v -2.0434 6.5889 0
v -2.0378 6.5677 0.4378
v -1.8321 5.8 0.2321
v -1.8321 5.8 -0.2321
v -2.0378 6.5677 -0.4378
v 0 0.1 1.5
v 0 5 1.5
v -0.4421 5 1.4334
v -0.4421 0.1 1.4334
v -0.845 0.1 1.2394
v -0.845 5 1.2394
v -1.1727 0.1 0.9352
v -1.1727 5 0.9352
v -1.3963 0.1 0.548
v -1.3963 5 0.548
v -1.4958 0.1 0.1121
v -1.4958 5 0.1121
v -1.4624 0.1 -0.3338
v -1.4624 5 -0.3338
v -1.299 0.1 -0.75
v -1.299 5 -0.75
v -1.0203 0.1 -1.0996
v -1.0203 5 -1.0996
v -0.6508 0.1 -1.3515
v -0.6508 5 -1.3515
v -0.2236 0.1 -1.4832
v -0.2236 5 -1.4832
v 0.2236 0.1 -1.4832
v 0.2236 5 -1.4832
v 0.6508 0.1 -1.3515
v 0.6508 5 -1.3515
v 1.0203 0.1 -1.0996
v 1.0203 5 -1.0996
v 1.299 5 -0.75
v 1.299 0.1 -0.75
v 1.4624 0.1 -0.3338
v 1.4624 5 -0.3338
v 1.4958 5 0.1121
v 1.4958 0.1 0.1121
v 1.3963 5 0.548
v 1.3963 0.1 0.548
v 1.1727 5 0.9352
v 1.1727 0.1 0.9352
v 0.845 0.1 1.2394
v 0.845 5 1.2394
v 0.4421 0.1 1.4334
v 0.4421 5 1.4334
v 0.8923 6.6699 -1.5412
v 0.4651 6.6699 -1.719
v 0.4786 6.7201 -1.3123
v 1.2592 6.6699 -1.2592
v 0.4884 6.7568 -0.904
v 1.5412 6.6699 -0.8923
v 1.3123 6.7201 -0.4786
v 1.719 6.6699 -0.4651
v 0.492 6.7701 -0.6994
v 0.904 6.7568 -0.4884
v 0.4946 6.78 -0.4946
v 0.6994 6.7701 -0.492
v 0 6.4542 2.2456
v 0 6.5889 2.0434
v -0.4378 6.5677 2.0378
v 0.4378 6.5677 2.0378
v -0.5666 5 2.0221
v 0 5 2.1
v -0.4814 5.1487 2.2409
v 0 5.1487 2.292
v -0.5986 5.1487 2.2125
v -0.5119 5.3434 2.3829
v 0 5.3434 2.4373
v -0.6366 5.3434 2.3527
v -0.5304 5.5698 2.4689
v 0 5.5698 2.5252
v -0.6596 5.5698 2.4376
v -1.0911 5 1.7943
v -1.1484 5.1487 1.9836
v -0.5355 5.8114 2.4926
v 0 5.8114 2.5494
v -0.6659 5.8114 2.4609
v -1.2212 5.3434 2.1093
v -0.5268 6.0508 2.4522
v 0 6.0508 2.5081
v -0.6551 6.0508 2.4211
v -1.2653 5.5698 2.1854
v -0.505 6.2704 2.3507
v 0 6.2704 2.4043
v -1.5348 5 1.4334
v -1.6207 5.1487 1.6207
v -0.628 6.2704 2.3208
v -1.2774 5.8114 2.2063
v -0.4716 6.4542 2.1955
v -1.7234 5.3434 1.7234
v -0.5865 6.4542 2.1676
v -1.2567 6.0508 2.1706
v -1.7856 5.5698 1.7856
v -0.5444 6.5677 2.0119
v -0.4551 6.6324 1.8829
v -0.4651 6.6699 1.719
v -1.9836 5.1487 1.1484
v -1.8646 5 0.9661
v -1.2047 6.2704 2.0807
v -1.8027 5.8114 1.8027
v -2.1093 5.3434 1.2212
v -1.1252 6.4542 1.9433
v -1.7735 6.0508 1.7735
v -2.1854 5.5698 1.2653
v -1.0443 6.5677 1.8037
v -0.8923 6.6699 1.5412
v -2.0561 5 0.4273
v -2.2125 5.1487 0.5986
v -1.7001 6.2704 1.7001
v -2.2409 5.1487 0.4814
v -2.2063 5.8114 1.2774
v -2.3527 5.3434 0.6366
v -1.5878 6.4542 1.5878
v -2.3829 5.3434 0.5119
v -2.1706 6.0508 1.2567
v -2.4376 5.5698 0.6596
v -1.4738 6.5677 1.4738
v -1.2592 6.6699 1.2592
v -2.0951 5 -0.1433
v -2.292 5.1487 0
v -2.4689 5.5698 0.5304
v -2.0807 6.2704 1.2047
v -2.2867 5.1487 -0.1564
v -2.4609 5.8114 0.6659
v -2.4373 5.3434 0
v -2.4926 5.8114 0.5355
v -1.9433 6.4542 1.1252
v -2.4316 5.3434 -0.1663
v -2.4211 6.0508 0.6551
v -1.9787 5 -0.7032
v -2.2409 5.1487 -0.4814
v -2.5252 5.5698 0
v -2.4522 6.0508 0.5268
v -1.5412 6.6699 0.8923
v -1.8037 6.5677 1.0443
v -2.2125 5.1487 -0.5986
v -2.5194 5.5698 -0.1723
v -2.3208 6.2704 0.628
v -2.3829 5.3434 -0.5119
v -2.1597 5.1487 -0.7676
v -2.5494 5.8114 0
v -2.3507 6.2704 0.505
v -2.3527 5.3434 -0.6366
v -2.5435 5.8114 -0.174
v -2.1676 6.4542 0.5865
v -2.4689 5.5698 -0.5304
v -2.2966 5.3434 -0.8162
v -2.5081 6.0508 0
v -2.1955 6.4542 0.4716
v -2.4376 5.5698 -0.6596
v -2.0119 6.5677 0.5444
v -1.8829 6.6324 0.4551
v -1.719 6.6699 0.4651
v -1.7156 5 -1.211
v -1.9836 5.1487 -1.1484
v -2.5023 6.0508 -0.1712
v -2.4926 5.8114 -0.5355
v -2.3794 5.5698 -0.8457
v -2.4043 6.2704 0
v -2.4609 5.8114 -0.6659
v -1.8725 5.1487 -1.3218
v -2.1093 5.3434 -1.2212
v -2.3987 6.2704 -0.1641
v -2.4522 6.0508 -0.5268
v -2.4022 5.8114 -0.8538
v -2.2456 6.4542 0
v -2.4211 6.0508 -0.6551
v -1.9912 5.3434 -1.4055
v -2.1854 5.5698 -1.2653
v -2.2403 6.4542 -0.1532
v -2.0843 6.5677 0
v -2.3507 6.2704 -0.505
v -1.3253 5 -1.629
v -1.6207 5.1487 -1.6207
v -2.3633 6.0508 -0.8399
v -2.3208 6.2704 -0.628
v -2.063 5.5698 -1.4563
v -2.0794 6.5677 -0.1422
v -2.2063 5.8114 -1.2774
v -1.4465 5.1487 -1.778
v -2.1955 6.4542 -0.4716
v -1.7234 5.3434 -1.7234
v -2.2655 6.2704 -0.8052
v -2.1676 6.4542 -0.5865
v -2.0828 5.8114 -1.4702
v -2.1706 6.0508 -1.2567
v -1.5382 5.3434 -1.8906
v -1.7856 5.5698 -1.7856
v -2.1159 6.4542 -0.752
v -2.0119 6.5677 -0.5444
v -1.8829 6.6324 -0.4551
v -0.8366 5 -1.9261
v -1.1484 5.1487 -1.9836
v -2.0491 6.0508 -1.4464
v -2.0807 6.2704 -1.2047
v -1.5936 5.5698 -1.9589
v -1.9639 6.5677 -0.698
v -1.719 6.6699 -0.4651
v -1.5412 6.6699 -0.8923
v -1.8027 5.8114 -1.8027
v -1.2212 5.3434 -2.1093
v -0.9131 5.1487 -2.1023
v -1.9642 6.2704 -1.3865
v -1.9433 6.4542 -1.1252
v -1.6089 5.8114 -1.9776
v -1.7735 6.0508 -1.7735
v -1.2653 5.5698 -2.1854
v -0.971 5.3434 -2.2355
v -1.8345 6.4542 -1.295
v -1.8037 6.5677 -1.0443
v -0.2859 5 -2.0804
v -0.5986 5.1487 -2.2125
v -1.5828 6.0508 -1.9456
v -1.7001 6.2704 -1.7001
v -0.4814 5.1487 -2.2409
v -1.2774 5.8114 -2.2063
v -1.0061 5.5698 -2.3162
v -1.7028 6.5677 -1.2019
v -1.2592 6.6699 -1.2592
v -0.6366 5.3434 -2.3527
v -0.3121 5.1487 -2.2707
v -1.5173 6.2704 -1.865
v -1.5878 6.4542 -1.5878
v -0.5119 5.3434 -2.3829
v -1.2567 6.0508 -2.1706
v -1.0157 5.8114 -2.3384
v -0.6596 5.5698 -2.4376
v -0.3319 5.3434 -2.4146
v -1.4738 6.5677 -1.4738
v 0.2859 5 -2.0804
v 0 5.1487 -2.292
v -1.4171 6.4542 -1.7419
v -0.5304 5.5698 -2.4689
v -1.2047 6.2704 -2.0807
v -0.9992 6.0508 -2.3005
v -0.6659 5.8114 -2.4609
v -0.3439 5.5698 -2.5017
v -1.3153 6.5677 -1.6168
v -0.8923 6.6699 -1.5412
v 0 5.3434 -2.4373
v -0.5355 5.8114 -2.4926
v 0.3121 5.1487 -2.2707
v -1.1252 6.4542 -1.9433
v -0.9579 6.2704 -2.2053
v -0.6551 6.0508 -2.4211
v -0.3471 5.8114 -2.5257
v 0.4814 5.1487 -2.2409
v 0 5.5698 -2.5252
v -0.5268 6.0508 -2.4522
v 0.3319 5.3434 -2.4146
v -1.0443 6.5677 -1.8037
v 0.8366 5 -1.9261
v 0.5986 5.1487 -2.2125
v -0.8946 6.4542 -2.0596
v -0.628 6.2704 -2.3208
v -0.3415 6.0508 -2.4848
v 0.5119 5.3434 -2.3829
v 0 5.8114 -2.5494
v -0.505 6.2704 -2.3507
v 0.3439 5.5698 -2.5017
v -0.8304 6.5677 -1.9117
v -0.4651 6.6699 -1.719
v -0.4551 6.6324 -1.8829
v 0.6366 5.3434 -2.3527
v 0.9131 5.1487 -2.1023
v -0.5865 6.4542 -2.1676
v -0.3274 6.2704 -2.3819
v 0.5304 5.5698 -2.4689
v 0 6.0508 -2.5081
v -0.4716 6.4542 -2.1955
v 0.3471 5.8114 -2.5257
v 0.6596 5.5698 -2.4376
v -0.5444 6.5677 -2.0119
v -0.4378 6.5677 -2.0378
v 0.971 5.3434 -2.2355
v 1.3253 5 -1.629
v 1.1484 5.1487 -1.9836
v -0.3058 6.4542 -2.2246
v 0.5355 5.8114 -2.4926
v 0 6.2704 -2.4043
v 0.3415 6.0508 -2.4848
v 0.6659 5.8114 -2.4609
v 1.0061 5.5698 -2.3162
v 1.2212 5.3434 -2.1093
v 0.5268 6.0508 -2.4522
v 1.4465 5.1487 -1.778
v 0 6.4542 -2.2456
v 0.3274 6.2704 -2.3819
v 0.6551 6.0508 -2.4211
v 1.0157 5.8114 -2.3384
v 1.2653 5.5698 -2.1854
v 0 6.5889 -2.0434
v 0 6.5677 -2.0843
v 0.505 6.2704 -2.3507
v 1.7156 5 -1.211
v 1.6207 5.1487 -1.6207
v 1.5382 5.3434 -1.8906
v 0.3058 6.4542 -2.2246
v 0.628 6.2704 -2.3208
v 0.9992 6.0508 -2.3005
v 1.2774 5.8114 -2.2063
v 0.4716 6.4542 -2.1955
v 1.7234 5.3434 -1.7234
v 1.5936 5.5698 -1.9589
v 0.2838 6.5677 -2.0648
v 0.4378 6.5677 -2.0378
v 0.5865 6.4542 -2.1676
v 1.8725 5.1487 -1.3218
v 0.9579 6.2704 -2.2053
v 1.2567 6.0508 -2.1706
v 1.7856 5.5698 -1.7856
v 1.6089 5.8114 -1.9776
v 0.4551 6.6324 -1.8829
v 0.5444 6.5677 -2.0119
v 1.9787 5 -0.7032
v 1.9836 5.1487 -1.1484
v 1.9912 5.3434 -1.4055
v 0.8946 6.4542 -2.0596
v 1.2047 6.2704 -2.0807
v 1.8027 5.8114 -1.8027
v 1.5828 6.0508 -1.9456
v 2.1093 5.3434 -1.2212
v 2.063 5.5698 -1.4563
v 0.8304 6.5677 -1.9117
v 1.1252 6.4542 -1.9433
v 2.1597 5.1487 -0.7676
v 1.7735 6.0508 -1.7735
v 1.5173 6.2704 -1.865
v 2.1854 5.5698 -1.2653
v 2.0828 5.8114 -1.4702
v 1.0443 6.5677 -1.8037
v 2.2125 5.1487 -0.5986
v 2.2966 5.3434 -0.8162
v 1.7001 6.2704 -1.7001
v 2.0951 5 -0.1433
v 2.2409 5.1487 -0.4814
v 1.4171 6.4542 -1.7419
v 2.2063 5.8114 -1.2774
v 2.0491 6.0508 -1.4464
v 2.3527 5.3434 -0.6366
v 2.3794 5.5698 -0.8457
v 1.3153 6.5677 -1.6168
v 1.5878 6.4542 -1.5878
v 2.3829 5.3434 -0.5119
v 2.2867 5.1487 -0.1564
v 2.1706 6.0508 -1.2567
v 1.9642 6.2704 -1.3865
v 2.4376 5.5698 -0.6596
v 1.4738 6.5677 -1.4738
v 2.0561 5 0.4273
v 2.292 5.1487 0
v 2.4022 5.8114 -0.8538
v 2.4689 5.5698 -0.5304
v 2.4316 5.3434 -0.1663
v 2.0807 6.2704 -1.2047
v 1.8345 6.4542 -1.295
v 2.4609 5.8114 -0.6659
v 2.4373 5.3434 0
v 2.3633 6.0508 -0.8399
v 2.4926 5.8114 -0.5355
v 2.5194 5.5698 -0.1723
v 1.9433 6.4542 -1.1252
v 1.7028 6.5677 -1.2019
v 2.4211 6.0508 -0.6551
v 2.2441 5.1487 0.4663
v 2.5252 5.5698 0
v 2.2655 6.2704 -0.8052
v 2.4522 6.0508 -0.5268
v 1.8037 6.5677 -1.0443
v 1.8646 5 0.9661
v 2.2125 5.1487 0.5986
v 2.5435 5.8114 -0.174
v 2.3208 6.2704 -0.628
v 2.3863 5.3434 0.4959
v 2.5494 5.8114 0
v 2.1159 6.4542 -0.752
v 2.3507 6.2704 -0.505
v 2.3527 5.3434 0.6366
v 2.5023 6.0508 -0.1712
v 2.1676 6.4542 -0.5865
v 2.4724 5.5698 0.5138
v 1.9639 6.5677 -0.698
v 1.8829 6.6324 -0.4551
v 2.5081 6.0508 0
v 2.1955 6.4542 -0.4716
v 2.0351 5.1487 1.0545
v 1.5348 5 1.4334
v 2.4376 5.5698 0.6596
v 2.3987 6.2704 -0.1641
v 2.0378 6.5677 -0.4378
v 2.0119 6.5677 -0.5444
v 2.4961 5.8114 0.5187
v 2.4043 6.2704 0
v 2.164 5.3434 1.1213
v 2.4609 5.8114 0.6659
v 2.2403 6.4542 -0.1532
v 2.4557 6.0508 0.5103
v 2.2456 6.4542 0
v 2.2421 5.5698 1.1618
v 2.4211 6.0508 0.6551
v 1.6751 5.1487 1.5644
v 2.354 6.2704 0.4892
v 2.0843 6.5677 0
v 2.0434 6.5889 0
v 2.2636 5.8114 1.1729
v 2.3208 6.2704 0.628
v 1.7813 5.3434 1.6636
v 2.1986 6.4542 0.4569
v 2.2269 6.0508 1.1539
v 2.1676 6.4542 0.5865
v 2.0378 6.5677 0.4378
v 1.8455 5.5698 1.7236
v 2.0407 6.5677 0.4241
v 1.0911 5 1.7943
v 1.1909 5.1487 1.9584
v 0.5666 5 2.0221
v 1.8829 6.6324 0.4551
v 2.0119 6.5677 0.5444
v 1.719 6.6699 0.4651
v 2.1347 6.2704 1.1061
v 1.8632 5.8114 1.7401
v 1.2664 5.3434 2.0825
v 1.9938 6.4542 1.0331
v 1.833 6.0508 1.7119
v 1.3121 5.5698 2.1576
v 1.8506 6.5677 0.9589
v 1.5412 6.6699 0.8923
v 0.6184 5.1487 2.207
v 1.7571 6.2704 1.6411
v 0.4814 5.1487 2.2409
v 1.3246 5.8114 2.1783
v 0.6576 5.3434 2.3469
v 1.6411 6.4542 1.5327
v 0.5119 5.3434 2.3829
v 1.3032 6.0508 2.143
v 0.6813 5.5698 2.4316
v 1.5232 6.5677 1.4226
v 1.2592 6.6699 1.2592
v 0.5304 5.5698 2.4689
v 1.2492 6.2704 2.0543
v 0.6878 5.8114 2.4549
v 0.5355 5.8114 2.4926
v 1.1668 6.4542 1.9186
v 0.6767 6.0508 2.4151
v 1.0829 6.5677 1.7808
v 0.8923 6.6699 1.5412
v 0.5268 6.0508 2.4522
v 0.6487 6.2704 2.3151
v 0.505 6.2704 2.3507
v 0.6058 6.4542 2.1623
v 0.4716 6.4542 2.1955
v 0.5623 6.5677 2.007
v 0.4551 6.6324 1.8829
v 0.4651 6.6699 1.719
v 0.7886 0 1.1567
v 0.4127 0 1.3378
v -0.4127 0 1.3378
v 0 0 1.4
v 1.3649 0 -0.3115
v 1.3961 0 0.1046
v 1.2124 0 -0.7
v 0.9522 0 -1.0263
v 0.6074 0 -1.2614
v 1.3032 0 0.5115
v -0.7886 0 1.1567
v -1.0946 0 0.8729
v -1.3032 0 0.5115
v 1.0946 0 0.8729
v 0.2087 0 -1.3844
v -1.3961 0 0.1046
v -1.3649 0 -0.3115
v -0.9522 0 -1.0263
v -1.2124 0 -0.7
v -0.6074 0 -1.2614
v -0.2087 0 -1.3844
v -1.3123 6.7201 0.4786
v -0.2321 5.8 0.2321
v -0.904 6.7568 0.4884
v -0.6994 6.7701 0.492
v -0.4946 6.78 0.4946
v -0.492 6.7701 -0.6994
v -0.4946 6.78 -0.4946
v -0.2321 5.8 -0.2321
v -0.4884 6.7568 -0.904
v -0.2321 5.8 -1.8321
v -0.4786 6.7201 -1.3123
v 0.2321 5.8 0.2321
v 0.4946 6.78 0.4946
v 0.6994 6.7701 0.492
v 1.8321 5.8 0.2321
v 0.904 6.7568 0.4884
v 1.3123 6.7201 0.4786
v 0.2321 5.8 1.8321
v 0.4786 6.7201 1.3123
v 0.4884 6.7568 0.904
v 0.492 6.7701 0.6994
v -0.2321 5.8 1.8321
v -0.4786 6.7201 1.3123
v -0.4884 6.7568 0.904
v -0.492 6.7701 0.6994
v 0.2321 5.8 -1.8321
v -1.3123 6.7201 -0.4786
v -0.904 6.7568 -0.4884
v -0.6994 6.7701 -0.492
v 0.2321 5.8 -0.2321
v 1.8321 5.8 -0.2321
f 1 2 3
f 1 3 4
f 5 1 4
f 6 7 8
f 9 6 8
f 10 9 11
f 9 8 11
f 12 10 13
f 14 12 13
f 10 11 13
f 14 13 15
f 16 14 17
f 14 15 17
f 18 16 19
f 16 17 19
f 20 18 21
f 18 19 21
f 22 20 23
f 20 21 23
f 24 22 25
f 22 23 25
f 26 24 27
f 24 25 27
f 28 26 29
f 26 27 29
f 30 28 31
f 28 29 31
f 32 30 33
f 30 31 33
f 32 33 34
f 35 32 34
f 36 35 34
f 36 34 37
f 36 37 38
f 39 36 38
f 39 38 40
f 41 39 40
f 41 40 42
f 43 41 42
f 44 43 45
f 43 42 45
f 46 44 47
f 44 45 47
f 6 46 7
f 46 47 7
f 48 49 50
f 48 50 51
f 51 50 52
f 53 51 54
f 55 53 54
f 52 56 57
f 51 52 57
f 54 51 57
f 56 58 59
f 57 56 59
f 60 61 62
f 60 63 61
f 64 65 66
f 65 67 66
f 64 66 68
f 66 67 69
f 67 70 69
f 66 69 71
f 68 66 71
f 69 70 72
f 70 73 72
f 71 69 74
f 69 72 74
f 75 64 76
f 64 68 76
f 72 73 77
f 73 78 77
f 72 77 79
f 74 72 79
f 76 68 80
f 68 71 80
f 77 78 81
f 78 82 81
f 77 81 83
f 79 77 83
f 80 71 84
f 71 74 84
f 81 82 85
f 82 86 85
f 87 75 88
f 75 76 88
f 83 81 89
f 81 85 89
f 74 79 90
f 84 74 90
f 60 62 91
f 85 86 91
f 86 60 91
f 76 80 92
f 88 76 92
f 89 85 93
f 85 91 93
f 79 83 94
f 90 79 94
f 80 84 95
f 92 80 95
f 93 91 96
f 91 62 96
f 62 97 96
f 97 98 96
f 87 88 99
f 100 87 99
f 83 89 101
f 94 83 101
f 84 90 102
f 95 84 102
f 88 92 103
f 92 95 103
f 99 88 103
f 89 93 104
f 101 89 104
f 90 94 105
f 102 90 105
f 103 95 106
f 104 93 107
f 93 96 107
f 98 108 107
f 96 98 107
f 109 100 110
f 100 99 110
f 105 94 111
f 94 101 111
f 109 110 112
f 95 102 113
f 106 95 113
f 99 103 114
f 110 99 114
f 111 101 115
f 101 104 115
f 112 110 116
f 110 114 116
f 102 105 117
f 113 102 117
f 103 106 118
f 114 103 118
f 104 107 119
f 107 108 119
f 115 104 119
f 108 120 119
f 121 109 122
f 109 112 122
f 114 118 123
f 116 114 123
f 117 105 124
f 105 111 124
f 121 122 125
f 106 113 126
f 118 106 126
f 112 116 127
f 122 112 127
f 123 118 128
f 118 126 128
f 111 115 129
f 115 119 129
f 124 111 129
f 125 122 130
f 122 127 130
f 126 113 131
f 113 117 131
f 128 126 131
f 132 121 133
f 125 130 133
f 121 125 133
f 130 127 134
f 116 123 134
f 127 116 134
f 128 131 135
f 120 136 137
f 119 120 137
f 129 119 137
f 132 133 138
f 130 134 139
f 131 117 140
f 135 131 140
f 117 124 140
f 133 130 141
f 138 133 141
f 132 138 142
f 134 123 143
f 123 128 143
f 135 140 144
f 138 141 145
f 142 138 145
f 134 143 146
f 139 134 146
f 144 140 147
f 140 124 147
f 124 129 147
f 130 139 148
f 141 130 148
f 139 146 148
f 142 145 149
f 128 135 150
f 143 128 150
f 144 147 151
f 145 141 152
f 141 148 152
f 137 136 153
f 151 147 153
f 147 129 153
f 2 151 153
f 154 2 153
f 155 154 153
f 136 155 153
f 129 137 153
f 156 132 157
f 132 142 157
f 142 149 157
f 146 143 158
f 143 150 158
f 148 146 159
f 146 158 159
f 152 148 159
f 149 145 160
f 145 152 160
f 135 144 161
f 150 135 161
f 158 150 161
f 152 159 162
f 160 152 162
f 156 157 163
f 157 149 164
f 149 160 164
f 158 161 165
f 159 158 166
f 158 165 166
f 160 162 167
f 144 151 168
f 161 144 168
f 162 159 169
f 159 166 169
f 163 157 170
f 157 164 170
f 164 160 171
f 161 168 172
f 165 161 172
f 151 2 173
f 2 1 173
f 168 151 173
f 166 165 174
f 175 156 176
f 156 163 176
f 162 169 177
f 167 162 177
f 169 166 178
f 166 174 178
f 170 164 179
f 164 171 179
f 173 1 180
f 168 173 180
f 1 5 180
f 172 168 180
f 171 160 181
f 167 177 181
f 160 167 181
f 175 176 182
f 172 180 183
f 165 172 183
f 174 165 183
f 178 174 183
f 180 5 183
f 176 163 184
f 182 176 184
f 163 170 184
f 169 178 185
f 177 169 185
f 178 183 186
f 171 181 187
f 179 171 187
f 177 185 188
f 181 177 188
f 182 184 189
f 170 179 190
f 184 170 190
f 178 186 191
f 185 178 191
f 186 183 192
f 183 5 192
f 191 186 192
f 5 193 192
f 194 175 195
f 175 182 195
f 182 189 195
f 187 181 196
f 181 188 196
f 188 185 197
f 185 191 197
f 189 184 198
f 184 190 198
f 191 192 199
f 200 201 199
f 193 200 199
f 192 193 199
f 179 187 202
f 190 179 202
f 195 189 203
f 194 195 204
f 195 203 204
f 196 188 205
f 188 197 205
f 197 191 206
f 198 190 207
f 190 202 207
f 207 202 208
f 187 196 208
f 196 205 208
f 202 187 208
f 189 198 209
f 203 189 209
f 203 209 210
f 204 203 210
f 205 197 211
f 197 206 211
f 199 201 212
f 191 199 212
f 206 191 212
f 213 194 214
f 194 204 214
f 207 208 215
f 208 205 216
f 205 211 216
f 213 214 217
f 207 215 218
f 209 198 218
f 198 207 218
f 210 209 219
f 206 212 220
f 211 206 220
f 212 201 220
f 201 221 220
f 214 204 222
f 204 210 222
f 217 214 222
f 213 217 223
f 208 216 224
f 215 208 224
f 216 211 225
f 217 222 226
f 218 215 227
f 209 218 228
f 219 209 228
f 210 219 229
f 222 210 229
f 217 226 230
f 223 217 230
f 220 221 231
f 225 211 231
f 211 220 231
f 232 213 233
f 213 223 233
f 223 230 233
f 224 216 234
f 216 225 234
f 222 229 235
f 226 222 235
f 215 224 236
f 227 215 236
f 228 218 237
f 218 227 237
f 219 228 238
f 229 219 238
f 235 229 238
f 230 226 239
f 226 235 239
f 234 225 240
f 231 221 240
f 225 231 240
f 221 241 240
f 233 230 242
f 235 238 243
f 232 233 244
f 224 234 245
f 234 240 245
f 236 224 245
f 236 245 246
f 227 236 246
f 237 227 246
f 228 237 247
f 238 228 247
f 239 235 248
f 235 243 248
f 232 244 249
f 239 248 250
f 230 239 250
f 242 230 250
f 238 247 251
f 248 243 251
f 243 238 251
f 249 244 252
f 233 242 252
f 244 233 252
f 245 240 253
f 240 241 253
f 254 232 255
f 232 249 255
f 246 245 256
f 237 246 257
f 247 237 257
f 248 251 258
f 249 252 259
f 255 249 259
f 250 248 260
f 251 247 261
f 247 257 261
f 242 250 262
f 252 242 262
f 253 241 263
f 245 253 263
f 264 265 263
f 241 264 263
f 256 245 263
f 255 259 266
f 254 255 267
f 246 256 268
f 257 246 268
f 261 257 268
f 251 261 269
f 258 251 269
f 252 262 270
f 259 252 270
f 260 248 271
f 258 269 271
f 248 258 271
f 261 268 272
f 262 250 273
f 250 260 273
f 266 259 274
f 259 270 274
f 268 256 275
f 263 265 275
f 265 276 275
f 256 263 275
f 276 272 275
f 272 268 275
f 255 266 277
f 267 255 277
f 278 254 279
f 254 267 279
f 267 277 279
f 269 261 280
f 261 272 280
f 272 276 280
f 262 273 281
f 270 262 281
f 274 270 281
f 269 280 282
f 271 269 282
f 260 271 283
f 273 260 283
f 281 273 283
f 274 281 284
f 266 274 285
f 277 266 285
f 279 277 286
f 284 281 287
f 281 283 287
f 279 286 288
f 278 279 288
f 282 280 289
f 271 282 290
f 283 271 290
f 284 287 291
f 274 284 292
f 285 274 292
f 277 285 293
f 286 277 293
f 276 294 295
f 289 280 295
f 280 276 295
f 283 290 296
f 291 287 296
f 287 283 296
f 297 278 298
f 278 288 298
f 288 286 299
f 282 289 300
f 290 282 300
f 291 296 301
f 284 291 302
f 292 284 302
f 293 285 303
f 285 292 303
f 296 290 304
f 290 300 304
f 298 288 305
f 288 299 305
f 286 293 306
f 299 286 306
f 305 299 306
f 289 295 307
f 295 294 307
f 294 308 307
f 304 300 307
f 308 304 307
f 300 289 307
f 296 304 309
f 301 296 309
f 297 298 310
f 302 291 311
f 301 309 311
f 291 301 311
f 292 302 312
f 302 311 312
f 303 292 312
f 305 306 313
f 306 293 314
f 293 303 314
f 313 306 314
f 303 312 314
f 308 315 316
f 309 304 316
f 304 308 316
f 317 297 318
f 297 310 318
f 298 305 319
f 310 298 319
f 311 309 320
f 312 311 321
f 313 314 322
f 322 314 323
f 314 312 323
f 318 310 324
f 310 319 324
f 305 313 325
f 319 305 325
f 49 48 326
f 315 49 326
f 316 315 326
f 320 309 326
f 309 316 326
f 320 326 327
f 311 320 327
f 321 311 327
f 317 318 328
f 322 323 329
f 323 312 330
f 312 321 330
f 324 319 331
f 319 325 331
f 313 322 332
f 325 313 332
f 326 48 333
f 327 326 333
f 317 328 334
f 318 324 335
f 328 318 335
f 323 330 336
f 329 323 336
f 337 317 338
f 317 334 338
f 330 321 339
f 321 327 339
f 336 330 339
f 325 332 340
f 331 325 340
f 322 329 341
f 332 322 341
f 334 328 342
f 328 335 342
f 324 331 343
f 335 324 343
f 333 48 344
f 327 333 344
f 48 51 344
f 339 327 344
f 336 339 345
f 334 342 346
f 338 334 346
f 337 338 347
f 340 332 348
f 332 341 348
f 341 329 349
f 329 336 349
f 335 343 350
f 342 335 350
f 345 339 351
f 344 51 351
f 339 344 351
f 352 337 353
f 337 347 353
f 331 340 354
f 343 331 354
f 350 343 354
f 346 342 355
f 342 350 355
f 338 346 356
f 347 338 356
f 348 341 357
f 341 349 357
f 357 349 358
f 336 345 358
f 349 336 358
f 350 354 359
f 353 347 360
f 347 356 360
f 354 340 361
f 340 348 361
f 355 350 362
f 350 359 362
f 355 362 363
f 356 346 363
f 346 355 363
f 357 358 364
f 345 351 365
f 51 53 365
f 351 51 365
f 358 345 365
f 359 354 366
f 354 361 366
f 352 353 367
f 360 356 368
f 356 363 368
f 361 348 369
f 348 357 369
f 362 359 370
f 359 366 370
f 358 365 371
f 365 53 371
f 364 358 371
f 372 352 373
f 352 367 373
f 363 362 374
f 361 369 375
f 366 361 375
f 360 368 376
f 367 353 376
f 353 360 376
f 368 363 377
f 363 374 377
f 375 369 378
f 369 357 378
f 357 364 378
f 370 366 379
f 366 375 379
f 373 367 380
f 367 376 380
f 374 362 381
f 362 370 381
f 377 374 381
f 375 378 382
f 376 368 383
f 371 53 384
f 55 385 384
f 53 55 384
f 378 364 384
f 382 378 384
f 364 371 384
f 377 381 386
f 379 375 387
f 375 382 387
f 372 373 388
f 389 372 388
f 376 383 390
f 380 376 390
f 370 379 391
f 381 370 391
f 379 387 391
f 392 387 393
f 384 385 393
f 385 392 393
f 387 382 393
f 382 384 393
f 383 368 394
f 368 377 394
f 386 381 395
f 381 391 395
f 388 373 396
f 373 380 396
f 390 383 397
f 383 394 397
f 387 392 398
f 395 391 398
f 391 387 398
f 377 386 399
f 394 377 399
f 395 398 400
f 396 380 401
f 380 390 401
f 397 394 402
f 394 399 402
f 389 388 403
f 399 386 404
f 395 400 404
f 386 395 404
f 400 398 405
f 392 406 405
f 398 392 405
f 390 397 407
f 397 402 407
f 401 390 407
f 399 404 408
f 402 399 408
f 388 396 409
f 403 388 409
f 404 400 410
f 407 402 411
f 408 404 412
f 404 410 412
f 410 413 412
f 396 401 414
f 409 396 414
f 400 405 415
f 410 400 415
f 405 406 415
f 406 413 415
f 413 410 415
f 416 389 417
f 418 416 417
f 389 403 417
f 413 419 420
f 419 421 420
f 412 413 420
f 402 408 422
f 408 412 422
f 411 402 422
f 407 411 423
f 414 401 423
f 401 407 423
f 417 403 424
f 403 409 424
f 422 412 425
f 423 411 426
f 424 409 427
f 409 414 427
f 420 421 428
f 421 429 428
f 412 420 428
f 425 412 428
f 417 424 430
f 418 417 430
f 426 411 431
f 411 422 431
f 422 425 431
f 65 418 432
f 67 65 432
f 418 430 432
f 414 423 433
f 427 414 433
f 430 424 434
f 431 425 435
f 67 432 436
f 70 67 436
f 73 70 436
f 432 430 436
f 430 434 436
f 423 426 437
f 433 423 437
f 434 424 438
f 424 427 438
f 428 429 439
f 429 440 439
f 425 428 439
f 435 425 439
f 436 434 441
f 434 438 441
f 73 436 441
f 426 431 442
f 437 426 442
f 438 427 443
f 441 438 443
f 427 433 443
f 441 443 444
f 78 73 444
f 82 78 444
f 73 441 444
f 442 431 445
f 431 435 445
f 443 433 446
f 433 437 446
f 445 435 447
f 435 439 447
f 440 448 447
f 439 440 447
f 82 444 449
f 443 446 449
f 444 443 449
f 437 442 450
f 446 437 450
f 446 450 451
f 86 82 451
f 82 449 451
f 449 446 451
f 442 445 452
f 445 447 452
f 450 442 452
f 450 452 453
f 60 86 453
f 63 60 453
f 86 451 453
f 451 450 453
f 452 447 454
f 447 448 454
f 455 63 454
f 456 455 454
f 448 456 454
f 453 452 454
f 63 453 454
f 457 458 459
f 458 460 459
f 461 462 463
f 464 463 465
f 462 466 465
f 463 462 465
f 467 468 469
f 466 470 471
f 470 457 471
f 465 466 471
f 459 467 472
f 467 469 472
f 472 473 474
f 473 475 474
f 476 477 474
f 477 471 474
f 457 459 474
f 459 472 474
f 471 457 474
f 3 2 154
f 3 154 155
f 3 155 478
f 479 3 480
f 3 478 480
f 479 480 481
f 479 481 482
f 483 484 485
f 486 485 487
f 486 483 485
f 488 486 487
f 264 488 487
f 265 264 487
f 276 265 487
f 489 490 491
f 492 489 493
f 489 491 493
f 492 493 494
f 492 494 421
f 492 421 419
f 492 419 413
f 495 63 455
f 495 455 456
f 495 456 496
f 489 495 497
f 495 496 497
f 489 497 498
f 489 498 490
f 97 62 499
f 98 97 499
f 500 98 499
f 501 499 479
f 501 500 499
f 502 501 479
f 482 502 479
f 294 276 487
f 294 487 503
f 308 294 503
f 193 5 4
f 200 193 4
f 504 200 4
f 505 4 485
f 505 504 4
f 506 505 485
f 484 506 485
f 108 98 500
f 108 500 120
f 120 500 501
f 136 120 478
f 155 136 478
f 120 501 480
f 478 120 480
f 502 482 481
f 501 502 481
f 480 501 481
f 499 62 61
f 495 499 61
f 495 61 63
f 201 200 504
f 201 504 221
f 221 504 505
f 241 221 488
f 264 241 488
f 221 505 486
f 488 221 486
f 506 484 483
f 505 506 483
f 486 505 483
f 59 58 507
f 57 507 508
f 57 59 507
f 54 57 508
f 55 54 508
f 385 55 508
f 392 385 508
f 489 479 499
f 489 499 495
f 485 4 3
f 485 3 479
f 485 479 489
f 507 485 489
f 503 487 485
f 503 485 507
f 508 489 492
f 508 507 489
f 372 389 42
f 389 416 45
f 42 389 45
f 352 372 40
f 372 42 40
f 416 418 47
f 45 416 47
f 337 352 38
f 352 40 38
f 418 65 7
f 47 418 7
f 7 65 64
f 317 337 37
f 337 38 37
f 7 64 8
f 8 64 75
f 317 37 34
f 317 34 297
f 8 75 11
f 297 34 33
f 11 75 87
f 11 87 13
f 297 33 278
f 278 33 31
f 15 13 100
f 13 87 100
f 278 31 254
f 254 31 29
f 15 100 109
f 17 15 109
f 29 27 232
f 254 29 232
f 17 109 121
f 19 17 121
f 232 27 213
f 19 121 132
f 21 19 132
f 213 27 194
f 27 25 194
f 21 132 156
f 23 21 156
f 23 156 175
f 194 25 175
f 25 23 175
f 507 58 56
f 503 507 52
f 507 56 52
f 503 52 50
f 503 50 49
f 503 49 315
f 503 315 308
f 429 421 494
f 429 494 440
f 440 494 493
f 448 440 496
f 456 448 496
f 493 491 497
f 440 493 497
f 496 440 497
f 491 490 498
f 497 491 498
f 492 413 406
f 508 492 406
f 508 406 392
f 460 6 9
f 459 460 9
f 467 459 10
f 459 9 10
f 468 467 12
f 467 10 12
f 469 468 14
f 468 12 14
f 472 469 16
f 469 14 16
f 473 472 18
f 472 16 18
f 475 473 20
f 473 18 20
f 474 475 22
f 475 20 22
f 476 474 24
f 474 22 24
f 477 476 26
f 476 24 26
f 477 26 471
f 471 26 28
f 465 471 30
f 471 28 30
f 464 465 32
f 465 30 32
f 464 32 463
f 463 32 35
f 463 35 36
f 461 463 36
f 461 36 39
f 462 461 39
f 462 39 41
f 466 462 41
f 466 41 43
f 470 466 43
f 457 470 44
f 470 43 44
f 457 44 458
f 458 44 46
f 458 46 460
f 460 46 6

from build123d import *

# Parameters (mm, degrees)
SKETCH_2_W                    = 4.2
SKETCH_2_H                    = 1
CUT_EXTRUDE_1_DEPTH           = 1
CUT_EXTRUDE_1_DRAFT           = -15
SKETCH_2_W_2                  = 1
SKETCH_2_H_2                  = 4.2
CUT_EXTRUDE_1_PROFILE_2_DEPTH = 1
CUT_EXTRUDE_1_PROFILE_2_DRAFT = -15
CHAMFER_1_SIZE                = 0.1


with BuildPart() as part:
    # 草图1 → 旋转1 (revolve)
    with BuildSketch(Plane.XY, mode=Mode.PRIVATE) as revolve_1_sk:
        with BuildLine():
            Line((0, 0), (1.5, 0))
            Line((1.5, 0), (1.5, 5))
            Line((1.5, 5), (2.1, 5))
            ThreePointArc((2.1, 5), (2.533998358, 5.948381153), (1.780839976, 6.669861464))
            ThreePointArc((1.780839976, 6.669861464), (0.892794357, 6.767422046), (0, 6.8))
            Line((0, 6.8), (0, 0))
        make_face()
    revolve(revolve_1_sk.sketch.rotate(Axis((0, 7.002401016, 0), (0, -1, 0)), 90), axis=Axis((0, 7.002401016, 0), (0, -1, 0)))


with BuildPart() as cut_extrude_1_tool:
    # 草图2 → 切除-拉伸1 (with draft: the straight prism first)
    with BuildSketch(Plane(origin=(0, 6.8, 0), x_dir=(1, 0, 0), z_dir=(0, 1, 0))):
        Rectangle(SKETCH_2_W, SKETCH_2_H)
    extrude(amount=-CUT_EXTRUDE_1_DEPTH)
    # 切除-拉伸1: the draft: its side faces are tilted about the plane it starts from
    cut_extrude_1_sides = [cut_extrude_1_tool.faces().sort_by_distance(p)[0] for p in [
        (0, 6.3, 0.5),
        (2.1, 6.3, 0),
        (0, 6.3, -0.5),
        (-2.1, 6.3, 0),
    ]]
    draft(cut_extrude_1_sides, Plane(origin=(0, 6.8, 0), x_dir=(1, 0, 0), z_dir=(0, 1, 0)), CUT_EXTRUDE_1_DRAFT)


with BuildPart() as part_1:
    add(part.part)

    # 切除-拉伸1: cut by cut_extrude_1_tool
    add(cut_extrude_1_tool.part, mode=Mode.SUBTRACT)


with BuildPart() as cut_extrude_1_profile_2_tool:
    # 草图2 → 切除-拉伸1 profile 2 (with draft: the straight prism first)
    with BuildSketch(Plane(origin=(0, 6.8, 0), x_dir=(1, 0, 0), z_dir=(0, 1, 0))):
        Rectangle(SKETCH_2_W_2, SKETCH_2_H_2)
    extrude(amount=-CUT_EXTRUDE_1_PROFILE_2_DEPTH)
    # 切除-拉伸1 profile 2: the draft: its side faces are tilted about the plane it starts from
    cut_extrude_1_profile_2_sides = [cut_extrude_1_profile_2_tool.faces().sort_by_distance(p)[0] for p in [
        (0, 6.3, 2.1),
        (0.5, 6.3, 0),
        (0, 6.3, -2.1),
        (-0.5, 6.3, 0),
    ]]
    draft(cut_extrude_1_profile_2_sides, Plane(origin=(0, 6.8, 0), x_dir=(1, 0, 0), z_dir=(0, 1, 0)), CUT_EXTRUDE_1_PROFILE_2_DRAFT)


with BuildPart() as part_2:
    add(part_1.part)

    # 切除-拉伸1 profile 2: cut by cut_extrude_1_profile_2_tool
    add(cut_extrude_1_profile_2_tool.part, mode=Mode.SUBTRACT)

    # 倒角1
    chamfer_1_edges = [part_2.edges().sort_by_distance(p)[0] for p in [
        (0, 0, -1.5),
    ]]
    chamfer(chamfer_1_edges, length=CHAMFER_1_SIZE)


solid = part_2.part
